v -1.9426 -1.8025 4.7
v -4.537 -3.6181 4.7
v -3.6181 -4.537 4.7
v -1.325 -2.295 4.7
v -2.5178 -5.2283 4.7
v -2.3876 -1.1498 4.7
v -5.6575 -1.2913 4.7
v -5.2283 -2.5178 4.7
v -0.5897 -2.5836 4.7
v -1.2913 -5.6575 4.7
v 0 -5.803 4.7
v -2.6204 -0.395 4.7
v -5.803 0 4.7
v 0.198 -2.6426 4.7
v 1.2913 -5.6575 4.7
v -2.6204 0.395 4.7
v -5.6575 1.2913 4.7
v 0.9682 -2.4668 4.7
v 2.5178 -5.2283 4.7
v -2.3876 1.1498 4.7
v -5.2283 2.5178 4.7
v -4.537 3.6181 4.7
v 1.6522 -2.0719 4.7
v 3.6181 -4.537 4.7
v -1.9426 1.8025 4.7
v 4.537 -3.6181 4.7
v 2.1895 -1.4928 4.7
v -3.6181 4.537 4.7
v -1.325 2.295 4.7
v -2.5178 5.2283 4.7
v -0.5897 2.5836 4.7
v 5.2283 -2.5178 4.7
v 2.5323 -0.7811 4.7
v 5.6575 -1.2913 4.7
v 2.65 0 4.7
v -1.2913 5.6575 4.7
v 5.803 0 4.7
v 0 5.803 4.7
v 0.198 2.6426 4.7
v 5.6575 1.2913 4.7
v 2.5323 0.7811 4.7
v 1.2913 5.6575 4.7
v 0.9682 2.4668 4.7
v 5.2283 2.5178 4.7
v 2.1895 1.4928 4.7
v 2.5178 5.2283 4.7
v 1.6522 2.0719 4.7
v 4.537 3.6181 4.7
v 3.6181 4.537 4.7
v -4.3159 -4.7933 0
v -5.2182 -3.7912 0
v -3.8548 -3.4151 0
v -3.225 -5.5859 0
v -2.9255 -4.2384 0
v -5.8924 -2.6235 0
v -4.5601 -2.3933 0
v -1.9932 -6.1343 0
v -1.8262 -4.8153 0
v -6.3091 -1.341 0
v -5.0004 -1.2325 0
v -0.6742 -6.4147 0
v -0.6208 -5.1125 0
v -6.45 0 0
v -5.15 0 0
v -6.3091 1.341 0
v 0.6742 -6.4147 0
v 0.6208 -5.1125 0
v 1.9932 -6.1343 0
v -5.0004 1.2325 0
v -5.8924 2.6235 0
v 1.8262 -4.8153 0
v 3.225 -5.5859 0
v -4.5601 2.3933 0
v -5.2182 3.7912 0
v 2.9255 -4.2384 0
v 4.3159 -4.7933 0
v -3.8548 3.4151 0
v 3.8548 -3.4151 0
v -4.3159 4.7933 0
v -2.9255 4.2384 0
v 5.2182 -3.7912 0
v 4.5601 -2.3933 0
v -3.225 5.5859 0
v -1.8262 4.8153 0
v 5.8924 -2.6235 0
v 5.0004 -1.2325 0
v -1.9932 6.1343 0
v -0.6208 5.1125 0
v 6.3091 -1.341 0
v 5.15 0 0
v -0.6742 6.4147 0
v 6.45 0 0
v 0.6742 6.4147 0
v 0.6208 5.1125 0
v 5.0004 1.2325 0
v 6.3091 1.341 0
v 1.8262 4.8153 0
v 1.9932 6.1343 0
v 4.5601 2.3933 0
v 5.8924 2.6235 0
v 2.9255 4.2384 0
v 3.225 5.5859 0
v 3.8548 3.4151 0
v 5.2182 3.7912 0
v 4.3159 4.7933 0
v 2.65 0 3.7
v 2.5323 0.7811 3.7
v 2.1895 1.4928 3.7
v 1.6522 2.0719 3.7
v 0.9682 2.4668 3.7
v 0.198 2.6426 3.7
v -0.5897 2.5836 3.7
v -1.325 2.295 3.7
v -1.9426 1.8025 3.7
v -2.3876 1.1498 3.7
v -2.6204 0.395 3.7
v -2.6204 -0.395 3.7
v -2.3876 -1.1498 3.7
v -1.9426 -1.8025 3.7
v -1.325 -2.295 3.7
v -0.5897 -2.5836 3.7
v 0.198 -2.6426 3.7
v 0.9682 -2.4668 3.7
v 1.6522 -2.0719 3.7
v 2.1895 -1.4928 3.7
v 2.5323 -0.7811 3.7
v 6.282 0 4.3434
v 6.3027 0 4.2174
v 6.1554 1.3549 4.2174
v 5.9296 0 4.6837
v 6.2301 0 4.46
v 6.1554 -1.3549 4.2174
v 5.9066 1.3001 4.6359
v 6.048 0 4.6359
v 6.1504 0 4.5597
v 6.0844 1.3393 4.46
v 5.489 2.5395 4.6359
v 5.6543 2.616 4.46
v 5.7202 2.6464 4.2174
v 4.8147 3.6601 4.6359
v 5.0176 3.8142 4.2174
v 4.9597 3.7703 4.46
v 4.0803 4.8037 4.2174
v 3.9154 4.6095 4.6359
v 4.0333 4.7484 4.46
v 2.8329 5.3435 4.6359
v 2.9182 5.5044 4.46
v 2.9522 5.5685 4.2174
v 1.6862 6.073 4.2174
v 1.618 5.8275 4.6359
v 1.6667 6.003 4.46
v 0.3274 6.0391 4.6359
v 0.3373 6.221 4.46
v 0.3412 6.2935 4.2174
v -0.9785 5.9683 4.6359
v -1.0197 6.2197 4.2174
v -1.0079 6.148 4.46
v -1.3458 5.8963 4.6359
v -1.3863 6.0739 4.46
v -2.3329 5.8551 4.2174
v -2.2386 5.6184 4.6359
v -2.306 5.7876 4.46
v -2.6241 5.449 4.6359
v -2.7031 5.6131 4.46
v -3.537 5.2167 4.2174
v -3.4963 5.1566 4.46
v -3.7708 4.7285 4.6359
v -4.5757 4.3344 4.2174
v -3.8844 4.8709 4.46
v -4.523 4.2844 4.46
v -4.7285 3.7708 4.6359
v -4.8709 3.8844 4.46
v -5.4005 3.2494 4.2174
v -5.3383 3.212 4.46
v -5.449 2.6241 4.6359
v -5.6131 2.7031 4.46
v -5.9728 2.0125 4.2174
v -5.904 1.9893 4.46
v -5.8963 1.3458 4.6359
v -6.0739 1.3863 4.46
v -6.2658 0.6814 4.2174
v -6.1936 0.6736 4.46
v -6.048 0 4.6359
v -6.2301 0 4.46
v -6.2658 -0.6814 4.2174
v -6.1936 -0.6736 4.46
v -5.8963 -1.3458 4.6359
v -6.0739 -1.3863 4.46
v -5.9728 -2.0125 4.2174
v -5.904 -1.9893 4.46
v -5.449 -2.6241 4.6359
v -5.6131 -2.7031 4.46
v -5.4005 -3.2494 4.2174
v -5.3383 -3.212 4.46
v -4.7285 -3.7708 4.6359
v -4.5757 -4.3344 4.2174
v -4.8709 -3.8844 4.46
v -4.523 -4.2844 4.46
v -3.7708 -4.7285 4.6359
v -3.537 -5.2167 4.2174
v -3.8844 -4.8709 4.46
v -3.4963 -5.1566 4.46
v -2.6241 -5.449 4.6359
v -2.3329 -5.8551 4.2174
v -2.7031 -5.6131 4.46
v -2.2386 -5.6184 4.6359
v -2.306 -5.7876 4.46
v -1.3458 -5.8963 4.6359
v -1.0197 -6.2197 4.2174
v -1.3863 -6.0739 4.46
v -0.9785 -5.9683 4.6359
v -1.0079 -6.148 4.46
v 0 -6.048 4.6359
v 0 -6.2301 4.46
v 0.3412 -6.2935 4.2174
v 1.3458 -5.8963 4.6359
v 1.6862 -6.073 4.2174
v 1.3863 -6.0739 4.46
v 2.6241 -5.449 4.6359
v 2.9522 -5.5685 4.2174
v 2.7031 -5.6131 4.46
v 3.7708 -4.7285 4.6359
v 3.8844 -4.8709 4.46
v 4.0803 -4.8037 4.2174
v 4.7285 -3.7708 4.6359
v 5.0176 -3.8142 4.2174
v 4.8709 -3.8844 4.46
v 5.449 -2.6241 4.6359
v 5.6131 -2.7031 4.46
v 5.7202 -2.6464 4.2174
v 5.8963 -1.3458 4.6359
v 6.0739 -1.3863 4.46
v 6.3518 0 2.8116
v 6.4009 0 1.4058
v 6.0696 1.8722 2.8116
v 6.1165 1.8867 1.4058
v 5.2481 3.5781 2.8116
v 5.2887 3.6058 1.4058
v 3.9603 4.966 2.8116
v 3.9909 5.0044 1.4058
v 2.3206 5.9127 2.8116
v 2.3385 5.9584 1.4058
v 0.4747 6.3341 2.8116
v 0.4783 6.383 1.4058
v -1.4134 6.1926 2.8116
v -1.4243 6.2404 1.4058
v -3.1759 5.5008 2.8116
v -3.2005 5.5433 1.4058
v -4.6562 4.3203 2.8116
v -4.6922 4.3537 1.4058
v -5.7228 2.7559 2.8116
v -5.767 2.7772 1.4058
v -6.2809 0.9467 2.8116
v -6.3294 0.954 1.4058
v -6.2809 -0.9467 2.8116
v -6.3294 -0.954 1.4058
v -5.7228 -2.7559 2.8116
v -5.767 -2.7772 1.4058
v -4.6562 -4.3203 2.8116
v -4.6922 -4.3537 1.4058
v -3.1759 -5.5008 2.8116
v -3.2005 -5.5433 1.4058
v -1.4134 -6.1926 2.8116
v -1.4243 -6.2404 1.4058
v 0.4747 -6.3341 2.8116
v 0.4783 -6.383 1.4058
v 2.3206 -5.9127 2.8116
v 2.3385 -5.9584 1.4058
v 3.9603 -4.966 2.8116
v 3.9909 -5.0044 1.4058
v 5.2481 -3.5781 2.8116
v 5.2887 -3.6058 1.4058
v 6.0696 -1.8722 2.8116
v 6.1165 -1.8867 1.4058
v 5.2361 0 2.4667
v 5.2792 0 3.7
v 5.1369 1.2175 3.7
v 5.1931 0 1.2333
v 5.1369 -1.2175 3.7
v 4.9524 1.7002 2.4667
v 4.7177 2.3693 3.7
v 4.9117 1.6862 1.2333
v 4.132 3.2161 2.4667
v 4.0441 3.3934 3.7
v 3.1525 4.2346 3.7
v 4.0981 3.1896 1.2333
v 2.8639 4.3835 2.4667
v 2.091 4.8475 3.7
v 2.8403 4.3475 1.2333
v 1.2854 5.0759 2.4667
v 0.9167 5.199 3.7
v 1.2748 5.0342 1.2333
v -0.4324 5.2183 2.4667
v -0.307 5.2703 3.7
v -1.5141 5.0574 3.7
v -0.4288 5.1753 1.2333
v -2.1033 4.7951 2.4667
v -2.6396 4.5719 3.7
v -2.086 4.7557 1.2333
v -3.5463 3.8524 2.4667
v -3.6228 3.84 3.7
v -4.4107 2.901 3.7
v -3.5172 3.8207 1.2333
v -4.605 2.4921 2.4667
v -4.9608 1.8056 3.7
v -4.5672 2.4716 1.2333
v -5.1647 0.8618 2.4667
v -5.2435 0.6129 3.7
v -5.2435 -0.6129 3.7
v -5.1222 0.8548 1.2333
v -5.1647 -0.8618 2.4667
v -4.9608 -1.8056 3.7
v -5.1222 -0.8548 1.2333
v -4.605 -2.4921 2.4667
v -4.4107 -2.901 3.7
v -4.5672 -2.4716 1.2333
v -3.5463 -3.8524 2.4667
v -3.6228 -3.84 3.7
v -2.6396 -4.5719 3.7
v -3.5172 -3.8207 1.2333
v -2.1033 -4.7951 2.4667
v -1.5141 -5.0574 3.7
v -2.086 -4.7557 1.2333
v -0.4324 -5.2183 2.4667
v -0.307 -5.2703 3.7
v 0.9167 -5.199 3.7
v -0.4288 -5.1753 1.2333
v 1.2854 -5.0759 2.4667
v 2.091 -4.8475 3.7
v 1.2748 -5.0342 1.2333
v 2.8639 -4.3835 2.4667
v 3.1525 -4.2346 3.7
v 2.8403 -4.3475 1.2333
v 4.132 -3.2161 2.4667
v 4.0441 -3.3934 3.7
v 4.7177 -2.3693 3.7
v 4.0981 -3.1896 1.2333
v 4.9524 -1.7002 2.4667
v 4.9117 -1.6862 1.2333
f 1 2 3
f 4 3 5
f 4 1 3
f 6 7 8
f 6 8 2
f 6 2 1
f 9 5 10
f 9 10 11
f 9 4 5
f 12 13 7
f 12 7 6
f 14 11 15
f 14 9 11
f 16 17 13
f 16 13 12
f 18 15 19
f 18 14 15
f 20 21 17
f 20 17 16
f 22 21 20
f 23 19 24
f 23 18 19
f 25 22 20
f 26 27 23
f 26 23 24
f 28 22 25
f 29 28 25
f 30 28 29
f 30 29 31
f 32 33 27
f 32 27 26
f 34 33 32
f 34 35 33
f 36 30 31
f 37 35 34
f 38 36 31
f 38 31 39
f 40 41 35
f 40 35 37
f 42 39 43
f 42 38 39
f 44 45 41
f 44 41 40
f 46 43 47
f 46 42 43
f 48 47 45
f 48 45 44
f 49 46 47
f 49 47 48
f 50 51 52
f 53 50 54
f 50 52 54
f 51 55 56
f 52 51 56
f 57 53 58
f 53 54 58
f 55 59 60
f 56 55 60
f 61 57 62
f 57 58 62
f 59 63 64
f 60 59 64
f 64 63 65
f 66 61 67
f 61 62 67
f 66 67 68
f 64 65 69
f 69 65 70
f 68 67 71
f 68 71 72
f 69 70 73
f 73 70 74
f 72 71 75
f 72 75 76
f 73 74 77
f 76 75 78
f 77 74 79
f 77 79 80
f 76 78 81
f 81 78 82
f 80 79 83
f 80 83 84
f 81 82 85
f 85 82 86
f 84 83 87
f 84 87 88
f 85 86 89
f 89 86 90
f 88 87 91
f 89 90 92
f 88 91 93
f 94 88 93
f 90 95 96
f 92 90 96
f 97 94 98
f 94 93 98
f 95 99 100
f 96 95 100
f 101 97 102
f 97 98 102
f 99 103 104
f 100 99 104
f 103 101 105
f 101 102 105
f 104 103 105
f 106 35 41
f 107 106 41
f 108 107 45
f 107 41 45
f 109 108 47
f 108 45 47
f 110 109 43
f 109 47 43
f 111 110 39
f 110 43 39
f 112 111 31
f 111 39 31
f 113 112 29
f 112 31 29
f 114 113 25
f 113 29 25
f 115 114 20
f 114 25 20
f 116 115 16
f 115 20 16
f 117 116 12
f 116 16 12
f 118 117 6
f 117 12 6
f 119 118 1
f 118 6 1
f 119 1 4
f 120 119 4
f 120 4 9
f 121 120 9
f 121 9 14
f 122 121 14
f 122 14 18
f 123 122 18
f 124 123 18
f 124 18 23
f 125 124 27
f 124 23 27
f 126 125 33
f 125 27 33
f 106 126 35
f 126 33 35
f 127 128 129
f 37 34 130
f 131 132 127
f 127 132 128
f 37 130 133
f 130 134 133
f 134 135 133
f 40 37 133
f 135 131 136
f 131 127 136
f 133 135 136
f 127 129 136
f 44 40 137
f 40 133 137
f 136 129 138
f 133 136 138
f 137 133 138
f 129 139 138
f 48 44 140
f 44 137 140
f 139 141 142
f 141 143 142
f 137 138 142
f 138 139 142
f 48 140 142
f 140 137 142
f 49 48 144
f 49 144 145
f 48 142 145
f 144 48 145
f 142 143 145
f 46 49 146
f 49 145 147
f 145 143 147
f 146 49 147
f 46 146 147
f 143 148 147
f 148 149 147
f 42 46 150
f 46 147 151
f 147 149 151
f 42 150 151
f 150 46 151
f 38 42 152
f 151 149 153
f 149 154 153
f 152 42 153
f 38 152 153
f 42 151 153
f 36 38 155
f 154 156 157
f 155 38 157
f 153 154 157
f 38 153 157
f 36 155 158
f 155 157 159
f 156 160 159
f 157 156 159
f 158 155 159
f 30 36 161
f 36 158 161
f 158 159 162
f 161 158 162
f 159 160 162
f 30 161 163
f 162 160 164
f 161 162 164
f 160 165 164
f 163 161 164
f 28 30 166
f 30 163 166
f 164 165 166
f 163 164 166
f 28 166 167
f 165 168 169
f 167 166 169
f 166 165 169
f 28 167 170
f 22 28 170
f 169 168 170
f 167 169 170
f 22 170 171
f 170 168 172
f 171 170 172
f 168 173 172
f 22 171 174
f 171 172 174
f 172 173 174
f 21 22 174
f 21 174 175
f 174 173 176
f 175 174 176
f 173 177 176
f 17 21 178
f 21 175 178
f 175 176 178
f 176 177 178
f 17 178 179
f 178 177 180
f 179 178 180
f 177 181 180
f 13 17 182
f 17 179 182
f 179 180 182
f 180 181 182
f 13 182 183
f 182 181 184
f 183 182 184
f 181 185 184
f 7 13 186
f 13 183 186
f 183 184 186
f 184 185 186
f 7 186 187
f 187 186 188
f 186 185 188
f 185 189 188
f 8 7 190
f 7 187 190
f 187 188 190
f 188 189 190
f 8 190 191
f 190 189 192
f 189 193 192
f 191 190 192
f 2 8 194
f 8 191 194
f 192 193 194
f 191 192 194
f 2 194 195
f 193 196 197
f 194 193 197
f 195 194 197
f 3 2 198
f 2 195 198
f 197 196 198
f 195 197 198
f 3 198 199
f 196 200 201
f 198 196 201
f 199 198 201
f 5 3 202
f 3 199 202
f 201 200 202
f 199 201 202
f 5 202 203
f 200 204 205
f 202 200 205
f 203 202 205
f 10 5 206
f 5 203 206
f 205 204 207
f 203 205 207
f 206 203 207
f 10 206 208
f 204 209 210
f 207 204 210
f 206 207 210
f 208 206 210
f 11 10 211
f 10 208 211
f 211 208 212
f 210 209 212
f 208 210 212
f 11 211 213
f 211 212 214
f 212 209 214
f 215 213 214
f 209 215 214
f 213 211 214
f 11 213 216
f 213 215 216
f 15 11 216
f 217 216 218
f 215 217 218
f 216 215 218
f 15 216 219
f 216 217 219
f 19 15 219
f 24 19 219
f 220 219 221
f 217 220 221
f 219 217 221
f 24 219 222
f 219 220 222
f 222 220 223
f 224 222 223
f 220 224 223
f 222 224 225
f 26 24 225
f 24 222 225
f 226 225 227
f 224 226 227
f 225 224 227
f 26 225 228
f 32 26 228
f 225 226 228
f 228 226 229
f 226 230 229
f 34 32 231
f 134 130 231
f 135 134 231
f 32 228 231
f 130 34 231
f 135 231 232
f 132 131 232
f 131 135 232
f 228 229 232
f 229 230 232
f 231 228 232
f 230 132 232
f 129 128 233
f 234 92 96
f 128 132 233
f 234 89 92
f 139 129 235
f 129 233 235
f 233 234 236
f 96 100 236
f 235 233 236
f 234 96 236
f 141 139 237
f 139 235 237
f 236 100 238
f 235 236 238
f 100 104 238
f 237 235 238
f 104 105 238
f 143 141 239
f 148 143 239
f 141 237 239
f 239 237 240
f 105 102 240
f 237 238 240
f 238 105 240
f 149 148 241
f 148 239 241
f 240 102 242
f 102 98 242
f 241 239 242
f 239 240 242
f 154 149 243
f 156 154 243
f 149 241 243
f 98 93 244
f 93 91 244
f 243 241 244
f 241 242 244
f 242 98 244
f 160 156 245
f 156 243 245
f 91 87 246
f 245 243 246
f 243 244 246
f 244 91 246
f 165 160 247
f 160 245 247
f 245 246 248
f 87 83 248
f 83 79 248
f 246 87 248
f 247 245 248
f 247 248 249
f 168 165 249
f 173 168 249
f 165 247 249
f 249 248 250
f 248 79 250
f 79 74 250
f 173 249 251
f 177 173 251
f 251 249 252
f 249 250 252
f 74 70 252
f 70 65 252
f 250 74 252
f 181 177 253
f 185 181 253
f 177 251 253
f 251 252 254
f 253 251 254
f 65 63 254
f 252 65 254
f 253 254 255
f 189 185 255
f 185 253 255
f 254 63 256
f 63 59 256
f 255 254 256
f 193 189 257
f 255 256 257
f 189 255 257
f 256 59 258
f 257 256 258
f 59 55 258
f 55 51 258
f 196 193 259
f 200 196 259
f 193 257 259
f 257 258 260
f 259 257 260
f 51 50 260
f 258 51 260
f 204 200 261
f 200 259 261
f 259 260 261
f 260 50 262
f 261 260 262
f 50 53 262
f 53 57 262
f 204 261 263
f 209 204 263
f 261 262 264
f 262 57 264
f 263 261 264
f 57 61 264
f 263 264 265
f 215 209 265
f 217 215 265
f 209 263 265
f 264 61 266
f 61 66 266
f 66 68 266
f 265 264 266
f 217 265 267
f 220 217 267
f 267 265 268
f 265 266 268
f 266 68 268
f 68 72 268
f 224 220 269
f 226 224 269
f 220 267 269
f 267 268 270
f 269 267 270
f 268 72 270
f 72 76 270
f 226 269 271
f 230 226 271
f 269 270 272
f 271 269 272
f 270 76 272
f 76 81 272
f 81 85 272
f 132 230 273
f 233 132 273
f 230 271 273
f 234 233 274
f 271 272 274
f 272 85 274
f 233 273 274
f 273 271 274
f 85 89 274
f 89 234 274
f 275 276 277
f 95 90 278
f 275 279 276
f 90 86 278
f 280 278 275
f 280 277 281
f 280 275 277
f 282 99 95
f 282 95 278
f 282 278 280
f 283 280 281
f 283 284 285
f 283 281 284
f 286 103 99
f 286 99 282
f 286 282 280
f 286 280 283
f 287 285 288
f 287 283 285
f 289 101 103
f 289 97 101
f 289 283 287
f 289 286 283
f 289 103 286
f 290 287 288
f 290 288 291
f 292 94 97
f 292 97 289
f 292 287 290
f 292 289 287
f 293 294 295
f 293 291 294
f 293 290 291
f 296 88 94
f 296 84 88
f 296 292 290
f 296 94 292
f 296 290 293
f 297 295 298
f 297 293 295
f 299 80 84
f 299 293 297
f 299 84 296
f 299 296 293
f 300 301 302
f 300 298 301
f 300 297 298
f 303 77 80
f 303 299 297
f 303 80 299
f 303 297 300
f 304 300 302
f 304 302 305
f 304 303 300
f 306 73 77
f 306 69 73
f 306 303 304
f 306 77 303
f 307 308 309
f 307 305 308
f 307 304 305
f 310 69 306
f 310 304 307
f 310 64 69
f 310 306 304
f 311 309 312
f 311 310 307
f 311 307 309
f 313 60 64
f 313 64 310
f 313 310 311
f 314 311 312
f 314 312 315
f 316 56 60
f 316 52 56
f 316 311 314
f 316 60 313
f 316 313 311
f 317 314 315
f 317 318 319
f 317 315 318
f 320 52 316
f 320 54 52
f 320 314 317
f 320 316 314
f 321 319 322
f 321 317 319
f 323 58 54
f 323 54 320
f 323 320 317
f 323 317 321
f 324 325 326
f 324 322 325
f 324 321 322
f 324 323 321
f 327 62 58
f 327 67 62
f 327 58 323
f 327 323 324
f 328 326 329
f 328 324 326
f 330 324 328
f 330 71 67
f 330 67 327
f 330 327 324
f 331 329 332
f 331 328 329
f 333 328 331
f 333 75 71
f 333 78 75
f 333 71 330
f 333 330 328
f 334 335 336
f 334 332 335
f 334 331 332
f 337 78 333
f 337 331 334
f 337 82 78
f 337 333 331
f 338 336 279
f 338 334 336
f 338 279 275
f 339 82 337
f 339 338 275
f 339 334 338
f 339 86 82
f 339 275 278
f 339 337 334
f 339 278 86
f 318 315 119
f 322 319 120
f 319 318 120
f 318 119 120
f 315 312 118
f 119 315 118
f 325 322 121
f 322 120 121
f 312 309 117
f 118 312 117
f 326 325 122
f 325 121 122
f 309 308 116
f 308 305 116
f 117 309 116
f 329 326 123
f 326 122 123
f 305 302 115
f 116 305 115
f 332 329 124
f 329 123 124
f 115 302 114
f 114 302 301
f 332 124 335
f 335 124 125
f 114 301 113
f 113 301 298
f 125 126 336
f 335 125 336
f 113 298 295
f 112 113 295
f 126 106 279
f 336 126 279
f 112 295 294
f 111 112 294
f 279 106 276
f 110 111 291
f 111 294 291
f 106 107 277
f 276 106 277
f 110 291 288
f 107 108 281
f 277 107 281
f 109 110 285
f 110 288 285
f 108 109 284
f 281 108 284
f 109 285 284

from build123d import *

# Parameters (mm, degrees)
ESQUISSE1_R        = 6.45
ESQUISSE1_R_2      = 5.15
BOSS_EXTRU_1_DEPTH = 4.7
BOSS_EXTRU_1_DRAFT = 2
ESQUISSE2_R        = 6.285872383
ESQUISSE2_R_2      = 2.65
BOSS_EXTRU_2_DEPTH = 1
CONG_1_R           = 0.5


with BuildPart() as part:
    # Esquisse1 → Boss.-Extru.1 (with draft: the straight prism first)
    with BuildSketch(Plane.XY):
        Circle(ESQUISSE1_R)
        Circle(ESQUISSE1_R_2, mode=Mode.SUBTRACT)
    extrude(amount=BOSS_EXTRU_1_DEPTH)
    # Boss.-Extru.1: the draft: its side faces are tilted about the plane it starts from
    boss_extru_1_sides = [part.faces().sort_by_distance(p)[0] for p in [
        (-6.45, 0, 2.35),
        (-5.15, 0, 2.35),
    ]]
    draft(boss_extru_1_sides, Plane.XY, BOSS_EXTRU_1_DRAFT)

    # Esquisse2 → Boss.-Extru.2 (add)
    with BuildSketch(Plane.XY.offset(4.7)):
        Circle(ESQUISSE2_R)
        Circle(ESQUISSE2_R_2, mode=Mode.SUBTRACT)
    extrude(amount=-BOSS_EXTRU_2_DEPTH)

    # Congé1
    cong_1_edges = [part.edges().sort_by_distance(p)[0] for p in [
        (-6.285872383, 0, 4.7),
    ]]
    fillet(cong_1_edges, radius=CONG_1_R)


solid = part.part
